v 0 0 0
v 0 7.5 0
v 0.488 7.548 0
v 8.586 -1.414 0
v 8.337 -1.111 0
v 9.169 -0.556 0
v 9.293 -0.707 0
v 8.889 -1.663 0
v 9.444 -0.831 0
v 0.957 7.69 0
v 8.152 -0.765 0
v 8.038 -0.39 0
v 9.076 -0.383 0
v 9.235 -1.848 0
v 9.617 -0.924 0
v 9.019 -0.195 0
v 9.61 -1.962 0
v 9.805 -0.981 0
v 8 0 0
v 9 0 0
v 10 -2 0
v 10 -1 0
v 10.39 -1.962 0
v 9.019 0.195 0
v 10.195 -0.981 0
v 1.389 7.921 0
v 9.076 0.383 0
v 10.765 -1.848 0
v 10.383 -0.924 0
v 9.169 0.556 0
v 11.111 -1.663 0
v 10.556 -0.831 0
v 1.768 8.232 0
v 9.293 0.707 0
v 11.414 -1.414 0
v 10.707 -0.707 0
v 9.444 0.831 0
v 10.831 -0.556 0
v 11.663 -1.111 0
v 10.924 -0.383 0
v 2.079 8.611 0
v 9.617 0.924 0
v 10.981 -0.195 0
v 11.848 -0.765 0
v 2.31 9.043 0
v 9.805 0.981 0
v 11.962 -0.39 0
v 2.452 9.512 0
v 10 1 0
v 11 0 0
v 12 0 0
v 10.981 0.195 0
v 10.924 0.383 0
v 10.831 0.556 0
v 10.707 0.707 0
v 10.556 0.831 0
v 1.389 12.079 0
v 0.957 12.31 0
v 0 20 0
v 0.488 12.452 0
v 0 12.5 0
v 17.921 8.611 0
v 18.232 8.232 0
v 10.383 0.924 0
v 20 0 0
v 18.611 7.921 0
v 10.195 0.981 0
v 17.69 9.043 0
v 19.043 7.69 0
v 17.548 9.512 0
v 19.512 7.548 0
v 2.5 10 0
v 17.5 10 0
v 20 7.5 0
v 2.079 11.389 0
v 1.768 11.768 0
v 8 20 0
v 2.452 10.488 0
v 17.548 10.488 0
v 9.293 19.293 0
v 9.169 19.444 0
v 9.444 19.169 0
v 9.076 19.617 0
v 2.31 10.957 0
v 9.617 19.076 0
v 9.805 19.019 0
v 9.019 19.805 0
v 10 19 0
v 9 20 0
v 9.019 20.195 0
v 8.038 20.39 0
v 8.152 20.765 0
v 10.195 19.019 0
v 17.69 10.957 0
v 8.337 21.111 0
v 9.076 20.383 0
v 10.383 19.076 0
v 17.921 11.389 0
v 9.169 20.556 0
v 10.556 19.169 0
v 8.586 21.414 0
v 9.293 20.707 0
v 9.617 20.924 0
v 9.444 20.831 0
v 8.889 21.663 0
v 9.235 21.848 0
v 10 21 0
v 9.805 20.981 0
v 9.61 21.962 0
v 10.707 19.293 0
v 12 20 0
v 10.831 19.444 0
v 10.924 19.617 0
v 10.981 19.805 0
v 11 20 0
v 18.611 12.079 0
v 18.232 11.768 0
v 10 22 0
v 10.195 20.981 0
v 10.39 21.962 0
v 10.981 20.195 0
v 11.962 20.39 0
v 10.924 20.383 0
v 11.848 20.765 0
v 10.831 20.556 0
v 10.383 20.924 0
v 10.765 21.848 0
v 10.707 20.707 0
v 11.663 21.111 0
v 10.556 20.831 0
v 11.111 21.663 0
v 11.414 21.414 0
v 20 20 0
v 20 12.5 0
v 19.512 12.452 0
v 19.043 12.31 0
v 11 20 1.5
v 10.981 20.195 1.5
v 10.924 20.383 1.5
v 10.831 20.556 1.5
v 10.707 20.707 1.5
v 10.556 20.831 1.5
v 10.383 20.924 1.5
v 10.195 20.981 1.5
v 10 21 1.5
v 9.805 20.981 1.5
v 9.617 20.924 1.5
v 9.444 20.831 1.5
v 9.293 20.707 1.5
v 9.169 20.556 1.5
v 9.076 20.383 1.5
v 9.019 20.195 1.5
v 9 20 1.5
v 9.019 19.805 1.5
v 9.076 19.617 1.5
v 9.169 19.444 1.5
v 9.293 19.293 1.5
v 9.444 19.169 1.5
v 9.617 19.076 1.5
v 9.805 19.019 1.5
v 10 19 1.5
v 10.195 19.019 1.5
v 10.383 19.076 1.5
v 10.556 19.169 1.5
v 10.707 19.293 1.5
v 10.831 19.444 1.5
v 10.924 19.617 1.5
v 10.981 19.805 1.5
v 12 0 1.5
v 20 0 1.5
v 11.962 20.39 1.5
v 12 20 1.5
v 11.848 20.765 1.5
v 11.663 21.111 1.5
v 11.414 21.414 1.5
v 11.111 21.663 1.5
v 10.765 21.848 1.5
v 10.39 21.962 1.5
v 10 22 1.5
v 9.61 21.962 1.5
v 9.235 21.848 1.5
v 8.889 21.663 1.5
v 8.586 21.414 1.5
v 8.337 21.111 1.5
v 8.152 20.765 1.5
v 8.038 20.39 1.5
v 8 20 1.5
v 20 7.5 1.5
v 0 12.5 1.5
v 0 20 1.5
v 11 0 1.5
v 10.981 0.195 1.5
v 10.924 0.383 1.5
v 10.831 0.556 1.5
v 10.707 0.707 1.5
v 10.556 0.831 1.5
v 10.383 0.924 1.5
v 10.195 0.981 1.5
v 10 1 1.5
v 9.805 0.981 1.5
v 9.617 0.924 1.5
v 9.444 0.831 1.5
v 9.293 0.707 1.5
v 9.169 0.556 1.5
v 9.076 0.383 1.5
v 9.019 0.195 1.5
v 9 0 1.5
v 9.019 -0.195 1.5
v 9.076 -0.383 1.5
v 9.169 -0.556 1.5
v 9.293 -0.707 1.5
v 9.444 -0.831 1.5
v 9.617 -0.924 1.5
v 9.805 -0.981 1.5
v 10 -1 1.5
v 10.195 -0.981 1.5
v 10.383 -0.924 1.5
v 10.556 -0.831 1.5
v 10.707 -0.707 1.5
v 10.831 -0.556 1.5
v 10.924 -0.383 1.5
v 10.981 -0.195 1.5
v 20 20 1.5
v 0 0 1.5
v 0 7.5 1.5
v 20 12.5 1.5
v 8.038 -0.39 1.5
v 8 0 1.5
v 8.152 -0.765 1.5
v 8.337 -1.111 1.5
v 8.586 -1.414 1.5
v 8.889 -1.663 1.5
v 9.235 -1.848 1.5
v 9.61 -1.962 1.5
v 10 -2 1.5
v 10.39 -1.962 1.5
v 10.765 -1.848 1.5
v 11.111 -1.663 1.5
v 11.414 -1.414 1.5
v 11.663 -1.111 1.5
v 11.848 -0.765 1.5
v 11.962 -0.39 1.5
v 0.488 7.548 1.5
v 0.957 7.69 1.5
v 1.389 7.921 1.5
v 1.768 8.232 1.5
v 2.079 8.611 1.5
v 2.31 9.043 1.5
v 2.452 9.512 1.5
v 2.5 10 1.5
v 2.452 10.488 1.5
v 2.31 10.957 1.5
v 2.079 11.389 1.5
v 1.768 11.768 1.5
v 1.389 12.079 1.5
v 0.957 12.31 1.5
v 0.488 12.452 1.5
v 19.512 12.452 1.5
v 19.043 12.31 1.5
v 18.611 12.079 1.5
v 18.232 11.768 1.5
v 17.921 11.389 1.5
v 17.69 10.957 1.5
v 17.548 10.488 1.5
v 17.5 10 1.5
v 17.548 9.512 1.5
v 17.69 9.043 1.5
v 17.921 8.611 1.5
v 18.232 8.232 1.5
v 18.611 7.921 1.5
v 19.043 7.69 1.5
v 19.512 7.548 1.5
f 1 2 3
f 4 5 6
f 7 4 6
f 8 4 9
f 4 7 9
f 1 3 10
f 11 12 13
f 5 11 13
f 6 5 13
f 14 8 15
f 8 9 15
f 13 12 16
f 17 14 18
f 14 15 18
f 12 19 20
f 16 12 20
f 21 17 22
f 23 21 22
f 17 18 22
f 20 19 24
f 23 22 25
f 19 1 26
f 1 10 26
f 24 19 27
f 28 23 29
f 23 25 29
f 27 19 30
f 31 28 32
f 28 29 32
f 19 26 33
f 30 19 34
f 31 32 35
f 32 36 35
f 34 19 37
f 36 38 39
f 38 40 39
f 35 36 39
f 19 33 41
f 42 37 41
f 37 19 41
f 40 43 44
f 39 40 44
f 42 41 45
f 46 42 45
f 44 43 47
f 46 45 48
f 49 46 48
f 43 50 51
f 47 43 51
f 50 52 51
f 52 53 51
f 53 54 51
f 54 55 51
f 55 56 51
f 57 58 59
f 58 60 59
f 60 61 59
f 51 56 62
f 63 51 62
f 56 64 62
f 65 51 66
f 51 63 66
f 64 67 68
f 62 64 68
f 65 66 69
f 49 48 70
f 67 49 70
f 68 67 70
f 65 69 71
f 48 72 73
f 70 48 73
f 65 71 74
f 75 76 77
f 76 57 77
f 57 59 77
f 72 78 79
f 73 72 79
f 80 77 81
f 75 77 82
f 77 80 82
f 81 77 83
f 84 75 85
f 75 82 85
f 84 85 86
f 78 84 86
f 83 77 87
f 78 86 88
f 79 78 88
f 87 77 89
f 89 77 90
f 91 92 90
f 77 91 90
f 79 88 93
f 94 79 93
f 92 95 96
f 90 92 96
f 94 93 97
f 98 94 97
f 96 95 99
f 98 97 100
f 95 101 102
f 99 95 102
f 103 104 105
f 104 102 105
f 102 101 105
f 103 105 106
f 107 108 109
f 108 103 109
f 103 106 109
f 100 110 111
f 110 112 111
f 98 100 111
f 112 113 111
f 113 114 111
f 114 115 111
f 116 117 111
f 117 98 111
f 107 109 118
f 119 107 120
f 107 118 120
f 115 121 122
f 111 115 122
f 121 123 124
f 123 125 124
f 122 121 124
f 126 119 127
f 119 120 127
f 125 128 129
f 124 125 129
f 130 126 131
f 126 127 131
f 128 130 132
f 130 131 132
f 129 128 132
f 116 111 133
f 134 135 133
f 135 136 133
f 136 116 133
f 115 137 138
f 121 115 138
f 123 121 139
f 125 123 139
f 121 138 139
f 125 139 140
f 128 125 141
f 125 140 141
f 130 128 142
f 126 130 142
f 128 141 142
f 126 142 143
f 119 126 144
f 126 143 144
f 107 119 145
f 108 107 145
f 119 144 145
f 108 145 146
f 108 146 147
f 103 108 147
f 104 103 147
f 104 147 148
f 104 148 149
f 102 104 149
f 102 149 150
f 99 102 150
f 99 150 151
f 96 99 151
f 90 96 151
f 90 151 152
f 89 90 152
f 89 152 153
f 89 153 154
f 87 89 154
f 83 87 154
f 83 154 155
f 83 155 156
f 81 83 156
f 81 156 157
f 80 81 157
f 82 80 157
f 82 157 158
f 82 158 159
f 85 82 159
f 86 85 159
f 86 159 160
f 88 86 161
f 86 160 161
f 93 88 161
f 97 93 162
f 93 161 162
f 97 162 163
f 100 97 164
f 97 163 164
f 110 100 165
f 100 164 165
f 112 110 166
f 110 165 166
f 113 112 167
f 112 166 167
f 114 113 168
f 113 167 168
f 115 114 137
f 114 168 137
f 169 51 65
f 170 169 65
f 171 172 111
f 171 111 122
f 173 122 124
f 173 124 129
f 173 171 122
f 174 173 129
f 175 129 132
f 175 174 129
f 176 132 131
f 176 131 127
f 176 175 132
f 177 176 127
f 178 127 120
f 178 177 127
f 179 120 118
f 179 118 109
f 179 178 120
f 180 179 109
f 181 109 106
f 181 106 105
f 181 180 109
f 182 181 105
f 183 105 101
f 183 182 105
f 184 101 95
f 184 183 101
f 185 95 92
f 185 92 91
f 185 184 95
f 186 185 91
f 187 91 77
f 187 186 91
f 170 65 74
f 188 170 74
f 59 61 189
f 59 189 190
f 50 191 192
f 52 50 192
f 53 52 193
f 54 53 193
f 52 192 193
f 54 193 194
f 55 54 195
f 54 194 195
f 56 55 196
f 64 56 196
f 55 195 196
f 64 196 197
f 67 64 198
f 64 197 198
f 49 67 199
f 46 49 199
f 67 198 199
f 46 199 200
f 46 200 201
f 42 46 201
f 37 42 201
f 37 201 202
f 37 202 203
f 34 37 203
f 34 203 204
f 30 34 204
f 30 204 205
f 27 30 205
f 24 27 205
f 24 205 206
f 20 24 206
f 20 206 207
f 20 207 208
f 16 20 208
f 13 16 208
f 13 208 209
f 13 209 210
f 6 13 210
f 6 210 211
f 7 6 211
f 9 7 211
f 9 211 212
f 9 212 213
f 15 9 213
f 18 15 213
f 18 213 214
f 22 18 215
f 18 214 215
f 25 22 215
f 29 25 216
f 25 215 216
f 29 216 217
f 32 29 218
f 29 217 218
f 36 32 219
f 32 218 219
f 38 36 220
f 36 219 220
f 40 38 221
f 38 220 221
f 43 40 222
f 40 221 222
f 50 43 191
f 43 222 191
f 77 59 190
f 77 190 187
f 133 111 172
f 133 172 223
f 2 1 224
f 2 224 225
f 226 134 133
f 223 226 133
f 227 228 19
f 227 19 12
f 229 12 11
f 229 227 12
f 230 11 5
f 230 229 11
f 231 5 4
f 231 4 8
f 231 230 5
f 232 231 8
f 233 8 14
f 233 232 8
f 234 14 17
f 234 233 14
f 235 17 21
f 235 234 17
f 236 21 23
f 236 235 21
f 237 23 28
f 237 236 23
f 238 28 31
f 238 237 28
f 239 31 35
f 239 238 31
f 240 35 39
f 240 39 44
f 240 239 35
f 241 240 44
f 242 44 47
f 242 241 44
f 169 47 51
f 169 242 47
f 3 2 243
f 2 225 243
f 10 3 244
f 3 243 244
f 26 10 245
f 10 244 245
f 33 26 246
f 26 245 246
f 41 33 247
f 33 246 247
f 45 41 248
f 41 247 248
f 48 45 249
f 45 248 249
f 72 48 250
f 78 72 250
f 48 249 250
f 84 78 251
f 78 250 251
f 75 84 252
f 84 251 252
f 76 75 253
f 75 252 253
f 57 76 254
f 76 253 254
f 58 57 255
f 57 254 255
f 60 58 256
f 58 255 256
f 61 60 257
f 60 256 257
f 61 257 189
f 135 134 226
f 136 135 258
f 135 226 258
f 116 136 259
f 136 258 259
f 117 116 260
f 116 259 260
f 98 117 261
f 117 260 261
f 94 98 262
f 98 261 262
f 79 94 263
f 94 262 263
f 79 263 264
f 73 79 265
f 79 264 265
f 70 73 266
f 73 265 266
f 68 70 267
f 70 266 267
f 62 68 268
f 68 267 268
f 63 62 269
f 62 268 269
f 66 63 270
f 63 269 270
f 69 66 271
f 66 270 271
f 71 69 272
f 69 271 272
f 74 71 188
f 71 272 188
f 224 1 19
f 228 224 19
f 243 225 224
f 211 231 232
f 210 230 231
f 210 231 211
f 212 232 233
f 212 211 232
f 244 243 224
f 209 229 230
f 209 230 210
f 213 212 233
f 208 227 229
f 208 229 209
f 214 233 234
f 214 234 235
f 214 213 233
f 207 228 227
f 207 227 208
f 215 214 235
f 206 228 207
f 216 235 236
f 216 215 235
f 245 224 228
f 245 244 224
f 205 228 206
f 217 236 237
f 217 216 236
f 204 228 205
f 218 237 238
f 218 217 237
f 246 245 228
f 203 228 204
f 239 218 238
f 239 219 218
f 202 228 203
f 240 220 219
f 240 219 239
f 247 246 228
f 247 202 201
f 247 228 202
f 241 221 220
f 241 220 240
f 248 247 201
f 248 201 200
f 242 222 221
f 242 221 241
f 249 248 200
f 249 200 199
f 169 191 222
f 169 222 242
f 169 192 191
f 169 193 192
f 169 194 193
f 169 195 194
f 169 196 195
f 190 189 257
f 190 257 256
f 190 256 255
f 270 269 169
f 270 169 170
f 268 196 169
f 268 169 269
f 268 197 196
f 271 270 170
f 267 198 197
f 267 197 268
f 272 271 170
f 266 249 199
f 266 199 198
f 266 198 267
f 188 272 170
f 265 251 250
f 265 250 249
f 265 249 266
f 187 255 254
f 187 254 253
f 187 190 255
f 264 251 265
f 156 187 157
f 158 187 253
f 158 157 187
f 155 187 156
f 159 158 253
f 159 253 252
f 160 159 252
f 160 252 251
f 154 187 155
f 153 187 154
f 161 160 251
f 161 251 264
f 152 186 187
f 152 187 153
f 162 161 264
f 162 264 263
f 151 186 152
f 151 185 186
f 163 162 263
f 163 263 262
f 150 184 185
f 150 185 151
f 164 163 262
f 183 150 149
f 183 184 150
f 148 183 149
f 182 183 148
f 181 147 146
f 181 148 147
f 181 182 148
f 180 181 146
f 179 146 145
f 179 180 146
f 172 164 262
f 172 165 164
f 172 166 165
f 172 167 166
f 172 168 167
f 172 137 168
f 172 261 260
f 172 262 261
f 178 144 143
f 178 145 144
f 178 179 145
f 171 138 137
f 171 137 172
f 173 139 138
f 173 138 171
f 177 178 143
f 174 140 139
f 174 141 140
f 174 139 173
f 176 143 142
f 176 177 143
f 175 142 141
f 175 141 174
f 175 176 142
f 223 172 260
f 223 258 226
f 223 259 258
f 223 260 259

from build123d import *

# Parameters (mm, degrees)
BOX_W           = 20
BOX_H           = 20
BOX_DEPTH       = 1.5
SKETCH_R        = 2
PAD_DEPTH       = 1.5
SKETCH001_R     = 1
POCKET_DEPTH    = 5
SKETCH002_R     = 2.5
POCKET001_DEPTH = 5


with BuildPart() as part:
    # Box → Box (new body)
    with BuildSketch(Plane.XY):
        with Locations((10, 10)):
            Rectangle(BOX_W, BOX_H)
    extrude(amount=BOX_DEPTH)

    # Sketch → Pad (new body)
    with BuildSketch(Plane.XY.offset(1.5)):
        with Locations((10, 20)):
            Circle(SKETCH_R)
        with Locations((10, 0)):
            Circle(SKETCH_R)
    extrude(amount=-PAD_DEPTH)

    # Sketch001 → Pocket (cut)
    with BuildSketch(Plane.XY.offset(1.5)):
        with Locations((10, 20)):
            Circle(SKETCH001_R)
        with Locations((10, 0)):
            Circle(SKETCH001_R)
    extrude(amount=-POCKET_DEPTH, mode=Mode.SUBTRACT)

    # Sketch002 → Pocket001 (cut)
    with BuildSketch(Plane.XY.offset(1.5)):
        with Locations((0, 10)):
            Circle(SKETCH002_R)
        with Locations((20, 10)):
            Circle(SKETCH002_R)
    extrude(amount=-POCKET001_DEPTH, mode=Mode.SUBTRACT)


solid = part.part
